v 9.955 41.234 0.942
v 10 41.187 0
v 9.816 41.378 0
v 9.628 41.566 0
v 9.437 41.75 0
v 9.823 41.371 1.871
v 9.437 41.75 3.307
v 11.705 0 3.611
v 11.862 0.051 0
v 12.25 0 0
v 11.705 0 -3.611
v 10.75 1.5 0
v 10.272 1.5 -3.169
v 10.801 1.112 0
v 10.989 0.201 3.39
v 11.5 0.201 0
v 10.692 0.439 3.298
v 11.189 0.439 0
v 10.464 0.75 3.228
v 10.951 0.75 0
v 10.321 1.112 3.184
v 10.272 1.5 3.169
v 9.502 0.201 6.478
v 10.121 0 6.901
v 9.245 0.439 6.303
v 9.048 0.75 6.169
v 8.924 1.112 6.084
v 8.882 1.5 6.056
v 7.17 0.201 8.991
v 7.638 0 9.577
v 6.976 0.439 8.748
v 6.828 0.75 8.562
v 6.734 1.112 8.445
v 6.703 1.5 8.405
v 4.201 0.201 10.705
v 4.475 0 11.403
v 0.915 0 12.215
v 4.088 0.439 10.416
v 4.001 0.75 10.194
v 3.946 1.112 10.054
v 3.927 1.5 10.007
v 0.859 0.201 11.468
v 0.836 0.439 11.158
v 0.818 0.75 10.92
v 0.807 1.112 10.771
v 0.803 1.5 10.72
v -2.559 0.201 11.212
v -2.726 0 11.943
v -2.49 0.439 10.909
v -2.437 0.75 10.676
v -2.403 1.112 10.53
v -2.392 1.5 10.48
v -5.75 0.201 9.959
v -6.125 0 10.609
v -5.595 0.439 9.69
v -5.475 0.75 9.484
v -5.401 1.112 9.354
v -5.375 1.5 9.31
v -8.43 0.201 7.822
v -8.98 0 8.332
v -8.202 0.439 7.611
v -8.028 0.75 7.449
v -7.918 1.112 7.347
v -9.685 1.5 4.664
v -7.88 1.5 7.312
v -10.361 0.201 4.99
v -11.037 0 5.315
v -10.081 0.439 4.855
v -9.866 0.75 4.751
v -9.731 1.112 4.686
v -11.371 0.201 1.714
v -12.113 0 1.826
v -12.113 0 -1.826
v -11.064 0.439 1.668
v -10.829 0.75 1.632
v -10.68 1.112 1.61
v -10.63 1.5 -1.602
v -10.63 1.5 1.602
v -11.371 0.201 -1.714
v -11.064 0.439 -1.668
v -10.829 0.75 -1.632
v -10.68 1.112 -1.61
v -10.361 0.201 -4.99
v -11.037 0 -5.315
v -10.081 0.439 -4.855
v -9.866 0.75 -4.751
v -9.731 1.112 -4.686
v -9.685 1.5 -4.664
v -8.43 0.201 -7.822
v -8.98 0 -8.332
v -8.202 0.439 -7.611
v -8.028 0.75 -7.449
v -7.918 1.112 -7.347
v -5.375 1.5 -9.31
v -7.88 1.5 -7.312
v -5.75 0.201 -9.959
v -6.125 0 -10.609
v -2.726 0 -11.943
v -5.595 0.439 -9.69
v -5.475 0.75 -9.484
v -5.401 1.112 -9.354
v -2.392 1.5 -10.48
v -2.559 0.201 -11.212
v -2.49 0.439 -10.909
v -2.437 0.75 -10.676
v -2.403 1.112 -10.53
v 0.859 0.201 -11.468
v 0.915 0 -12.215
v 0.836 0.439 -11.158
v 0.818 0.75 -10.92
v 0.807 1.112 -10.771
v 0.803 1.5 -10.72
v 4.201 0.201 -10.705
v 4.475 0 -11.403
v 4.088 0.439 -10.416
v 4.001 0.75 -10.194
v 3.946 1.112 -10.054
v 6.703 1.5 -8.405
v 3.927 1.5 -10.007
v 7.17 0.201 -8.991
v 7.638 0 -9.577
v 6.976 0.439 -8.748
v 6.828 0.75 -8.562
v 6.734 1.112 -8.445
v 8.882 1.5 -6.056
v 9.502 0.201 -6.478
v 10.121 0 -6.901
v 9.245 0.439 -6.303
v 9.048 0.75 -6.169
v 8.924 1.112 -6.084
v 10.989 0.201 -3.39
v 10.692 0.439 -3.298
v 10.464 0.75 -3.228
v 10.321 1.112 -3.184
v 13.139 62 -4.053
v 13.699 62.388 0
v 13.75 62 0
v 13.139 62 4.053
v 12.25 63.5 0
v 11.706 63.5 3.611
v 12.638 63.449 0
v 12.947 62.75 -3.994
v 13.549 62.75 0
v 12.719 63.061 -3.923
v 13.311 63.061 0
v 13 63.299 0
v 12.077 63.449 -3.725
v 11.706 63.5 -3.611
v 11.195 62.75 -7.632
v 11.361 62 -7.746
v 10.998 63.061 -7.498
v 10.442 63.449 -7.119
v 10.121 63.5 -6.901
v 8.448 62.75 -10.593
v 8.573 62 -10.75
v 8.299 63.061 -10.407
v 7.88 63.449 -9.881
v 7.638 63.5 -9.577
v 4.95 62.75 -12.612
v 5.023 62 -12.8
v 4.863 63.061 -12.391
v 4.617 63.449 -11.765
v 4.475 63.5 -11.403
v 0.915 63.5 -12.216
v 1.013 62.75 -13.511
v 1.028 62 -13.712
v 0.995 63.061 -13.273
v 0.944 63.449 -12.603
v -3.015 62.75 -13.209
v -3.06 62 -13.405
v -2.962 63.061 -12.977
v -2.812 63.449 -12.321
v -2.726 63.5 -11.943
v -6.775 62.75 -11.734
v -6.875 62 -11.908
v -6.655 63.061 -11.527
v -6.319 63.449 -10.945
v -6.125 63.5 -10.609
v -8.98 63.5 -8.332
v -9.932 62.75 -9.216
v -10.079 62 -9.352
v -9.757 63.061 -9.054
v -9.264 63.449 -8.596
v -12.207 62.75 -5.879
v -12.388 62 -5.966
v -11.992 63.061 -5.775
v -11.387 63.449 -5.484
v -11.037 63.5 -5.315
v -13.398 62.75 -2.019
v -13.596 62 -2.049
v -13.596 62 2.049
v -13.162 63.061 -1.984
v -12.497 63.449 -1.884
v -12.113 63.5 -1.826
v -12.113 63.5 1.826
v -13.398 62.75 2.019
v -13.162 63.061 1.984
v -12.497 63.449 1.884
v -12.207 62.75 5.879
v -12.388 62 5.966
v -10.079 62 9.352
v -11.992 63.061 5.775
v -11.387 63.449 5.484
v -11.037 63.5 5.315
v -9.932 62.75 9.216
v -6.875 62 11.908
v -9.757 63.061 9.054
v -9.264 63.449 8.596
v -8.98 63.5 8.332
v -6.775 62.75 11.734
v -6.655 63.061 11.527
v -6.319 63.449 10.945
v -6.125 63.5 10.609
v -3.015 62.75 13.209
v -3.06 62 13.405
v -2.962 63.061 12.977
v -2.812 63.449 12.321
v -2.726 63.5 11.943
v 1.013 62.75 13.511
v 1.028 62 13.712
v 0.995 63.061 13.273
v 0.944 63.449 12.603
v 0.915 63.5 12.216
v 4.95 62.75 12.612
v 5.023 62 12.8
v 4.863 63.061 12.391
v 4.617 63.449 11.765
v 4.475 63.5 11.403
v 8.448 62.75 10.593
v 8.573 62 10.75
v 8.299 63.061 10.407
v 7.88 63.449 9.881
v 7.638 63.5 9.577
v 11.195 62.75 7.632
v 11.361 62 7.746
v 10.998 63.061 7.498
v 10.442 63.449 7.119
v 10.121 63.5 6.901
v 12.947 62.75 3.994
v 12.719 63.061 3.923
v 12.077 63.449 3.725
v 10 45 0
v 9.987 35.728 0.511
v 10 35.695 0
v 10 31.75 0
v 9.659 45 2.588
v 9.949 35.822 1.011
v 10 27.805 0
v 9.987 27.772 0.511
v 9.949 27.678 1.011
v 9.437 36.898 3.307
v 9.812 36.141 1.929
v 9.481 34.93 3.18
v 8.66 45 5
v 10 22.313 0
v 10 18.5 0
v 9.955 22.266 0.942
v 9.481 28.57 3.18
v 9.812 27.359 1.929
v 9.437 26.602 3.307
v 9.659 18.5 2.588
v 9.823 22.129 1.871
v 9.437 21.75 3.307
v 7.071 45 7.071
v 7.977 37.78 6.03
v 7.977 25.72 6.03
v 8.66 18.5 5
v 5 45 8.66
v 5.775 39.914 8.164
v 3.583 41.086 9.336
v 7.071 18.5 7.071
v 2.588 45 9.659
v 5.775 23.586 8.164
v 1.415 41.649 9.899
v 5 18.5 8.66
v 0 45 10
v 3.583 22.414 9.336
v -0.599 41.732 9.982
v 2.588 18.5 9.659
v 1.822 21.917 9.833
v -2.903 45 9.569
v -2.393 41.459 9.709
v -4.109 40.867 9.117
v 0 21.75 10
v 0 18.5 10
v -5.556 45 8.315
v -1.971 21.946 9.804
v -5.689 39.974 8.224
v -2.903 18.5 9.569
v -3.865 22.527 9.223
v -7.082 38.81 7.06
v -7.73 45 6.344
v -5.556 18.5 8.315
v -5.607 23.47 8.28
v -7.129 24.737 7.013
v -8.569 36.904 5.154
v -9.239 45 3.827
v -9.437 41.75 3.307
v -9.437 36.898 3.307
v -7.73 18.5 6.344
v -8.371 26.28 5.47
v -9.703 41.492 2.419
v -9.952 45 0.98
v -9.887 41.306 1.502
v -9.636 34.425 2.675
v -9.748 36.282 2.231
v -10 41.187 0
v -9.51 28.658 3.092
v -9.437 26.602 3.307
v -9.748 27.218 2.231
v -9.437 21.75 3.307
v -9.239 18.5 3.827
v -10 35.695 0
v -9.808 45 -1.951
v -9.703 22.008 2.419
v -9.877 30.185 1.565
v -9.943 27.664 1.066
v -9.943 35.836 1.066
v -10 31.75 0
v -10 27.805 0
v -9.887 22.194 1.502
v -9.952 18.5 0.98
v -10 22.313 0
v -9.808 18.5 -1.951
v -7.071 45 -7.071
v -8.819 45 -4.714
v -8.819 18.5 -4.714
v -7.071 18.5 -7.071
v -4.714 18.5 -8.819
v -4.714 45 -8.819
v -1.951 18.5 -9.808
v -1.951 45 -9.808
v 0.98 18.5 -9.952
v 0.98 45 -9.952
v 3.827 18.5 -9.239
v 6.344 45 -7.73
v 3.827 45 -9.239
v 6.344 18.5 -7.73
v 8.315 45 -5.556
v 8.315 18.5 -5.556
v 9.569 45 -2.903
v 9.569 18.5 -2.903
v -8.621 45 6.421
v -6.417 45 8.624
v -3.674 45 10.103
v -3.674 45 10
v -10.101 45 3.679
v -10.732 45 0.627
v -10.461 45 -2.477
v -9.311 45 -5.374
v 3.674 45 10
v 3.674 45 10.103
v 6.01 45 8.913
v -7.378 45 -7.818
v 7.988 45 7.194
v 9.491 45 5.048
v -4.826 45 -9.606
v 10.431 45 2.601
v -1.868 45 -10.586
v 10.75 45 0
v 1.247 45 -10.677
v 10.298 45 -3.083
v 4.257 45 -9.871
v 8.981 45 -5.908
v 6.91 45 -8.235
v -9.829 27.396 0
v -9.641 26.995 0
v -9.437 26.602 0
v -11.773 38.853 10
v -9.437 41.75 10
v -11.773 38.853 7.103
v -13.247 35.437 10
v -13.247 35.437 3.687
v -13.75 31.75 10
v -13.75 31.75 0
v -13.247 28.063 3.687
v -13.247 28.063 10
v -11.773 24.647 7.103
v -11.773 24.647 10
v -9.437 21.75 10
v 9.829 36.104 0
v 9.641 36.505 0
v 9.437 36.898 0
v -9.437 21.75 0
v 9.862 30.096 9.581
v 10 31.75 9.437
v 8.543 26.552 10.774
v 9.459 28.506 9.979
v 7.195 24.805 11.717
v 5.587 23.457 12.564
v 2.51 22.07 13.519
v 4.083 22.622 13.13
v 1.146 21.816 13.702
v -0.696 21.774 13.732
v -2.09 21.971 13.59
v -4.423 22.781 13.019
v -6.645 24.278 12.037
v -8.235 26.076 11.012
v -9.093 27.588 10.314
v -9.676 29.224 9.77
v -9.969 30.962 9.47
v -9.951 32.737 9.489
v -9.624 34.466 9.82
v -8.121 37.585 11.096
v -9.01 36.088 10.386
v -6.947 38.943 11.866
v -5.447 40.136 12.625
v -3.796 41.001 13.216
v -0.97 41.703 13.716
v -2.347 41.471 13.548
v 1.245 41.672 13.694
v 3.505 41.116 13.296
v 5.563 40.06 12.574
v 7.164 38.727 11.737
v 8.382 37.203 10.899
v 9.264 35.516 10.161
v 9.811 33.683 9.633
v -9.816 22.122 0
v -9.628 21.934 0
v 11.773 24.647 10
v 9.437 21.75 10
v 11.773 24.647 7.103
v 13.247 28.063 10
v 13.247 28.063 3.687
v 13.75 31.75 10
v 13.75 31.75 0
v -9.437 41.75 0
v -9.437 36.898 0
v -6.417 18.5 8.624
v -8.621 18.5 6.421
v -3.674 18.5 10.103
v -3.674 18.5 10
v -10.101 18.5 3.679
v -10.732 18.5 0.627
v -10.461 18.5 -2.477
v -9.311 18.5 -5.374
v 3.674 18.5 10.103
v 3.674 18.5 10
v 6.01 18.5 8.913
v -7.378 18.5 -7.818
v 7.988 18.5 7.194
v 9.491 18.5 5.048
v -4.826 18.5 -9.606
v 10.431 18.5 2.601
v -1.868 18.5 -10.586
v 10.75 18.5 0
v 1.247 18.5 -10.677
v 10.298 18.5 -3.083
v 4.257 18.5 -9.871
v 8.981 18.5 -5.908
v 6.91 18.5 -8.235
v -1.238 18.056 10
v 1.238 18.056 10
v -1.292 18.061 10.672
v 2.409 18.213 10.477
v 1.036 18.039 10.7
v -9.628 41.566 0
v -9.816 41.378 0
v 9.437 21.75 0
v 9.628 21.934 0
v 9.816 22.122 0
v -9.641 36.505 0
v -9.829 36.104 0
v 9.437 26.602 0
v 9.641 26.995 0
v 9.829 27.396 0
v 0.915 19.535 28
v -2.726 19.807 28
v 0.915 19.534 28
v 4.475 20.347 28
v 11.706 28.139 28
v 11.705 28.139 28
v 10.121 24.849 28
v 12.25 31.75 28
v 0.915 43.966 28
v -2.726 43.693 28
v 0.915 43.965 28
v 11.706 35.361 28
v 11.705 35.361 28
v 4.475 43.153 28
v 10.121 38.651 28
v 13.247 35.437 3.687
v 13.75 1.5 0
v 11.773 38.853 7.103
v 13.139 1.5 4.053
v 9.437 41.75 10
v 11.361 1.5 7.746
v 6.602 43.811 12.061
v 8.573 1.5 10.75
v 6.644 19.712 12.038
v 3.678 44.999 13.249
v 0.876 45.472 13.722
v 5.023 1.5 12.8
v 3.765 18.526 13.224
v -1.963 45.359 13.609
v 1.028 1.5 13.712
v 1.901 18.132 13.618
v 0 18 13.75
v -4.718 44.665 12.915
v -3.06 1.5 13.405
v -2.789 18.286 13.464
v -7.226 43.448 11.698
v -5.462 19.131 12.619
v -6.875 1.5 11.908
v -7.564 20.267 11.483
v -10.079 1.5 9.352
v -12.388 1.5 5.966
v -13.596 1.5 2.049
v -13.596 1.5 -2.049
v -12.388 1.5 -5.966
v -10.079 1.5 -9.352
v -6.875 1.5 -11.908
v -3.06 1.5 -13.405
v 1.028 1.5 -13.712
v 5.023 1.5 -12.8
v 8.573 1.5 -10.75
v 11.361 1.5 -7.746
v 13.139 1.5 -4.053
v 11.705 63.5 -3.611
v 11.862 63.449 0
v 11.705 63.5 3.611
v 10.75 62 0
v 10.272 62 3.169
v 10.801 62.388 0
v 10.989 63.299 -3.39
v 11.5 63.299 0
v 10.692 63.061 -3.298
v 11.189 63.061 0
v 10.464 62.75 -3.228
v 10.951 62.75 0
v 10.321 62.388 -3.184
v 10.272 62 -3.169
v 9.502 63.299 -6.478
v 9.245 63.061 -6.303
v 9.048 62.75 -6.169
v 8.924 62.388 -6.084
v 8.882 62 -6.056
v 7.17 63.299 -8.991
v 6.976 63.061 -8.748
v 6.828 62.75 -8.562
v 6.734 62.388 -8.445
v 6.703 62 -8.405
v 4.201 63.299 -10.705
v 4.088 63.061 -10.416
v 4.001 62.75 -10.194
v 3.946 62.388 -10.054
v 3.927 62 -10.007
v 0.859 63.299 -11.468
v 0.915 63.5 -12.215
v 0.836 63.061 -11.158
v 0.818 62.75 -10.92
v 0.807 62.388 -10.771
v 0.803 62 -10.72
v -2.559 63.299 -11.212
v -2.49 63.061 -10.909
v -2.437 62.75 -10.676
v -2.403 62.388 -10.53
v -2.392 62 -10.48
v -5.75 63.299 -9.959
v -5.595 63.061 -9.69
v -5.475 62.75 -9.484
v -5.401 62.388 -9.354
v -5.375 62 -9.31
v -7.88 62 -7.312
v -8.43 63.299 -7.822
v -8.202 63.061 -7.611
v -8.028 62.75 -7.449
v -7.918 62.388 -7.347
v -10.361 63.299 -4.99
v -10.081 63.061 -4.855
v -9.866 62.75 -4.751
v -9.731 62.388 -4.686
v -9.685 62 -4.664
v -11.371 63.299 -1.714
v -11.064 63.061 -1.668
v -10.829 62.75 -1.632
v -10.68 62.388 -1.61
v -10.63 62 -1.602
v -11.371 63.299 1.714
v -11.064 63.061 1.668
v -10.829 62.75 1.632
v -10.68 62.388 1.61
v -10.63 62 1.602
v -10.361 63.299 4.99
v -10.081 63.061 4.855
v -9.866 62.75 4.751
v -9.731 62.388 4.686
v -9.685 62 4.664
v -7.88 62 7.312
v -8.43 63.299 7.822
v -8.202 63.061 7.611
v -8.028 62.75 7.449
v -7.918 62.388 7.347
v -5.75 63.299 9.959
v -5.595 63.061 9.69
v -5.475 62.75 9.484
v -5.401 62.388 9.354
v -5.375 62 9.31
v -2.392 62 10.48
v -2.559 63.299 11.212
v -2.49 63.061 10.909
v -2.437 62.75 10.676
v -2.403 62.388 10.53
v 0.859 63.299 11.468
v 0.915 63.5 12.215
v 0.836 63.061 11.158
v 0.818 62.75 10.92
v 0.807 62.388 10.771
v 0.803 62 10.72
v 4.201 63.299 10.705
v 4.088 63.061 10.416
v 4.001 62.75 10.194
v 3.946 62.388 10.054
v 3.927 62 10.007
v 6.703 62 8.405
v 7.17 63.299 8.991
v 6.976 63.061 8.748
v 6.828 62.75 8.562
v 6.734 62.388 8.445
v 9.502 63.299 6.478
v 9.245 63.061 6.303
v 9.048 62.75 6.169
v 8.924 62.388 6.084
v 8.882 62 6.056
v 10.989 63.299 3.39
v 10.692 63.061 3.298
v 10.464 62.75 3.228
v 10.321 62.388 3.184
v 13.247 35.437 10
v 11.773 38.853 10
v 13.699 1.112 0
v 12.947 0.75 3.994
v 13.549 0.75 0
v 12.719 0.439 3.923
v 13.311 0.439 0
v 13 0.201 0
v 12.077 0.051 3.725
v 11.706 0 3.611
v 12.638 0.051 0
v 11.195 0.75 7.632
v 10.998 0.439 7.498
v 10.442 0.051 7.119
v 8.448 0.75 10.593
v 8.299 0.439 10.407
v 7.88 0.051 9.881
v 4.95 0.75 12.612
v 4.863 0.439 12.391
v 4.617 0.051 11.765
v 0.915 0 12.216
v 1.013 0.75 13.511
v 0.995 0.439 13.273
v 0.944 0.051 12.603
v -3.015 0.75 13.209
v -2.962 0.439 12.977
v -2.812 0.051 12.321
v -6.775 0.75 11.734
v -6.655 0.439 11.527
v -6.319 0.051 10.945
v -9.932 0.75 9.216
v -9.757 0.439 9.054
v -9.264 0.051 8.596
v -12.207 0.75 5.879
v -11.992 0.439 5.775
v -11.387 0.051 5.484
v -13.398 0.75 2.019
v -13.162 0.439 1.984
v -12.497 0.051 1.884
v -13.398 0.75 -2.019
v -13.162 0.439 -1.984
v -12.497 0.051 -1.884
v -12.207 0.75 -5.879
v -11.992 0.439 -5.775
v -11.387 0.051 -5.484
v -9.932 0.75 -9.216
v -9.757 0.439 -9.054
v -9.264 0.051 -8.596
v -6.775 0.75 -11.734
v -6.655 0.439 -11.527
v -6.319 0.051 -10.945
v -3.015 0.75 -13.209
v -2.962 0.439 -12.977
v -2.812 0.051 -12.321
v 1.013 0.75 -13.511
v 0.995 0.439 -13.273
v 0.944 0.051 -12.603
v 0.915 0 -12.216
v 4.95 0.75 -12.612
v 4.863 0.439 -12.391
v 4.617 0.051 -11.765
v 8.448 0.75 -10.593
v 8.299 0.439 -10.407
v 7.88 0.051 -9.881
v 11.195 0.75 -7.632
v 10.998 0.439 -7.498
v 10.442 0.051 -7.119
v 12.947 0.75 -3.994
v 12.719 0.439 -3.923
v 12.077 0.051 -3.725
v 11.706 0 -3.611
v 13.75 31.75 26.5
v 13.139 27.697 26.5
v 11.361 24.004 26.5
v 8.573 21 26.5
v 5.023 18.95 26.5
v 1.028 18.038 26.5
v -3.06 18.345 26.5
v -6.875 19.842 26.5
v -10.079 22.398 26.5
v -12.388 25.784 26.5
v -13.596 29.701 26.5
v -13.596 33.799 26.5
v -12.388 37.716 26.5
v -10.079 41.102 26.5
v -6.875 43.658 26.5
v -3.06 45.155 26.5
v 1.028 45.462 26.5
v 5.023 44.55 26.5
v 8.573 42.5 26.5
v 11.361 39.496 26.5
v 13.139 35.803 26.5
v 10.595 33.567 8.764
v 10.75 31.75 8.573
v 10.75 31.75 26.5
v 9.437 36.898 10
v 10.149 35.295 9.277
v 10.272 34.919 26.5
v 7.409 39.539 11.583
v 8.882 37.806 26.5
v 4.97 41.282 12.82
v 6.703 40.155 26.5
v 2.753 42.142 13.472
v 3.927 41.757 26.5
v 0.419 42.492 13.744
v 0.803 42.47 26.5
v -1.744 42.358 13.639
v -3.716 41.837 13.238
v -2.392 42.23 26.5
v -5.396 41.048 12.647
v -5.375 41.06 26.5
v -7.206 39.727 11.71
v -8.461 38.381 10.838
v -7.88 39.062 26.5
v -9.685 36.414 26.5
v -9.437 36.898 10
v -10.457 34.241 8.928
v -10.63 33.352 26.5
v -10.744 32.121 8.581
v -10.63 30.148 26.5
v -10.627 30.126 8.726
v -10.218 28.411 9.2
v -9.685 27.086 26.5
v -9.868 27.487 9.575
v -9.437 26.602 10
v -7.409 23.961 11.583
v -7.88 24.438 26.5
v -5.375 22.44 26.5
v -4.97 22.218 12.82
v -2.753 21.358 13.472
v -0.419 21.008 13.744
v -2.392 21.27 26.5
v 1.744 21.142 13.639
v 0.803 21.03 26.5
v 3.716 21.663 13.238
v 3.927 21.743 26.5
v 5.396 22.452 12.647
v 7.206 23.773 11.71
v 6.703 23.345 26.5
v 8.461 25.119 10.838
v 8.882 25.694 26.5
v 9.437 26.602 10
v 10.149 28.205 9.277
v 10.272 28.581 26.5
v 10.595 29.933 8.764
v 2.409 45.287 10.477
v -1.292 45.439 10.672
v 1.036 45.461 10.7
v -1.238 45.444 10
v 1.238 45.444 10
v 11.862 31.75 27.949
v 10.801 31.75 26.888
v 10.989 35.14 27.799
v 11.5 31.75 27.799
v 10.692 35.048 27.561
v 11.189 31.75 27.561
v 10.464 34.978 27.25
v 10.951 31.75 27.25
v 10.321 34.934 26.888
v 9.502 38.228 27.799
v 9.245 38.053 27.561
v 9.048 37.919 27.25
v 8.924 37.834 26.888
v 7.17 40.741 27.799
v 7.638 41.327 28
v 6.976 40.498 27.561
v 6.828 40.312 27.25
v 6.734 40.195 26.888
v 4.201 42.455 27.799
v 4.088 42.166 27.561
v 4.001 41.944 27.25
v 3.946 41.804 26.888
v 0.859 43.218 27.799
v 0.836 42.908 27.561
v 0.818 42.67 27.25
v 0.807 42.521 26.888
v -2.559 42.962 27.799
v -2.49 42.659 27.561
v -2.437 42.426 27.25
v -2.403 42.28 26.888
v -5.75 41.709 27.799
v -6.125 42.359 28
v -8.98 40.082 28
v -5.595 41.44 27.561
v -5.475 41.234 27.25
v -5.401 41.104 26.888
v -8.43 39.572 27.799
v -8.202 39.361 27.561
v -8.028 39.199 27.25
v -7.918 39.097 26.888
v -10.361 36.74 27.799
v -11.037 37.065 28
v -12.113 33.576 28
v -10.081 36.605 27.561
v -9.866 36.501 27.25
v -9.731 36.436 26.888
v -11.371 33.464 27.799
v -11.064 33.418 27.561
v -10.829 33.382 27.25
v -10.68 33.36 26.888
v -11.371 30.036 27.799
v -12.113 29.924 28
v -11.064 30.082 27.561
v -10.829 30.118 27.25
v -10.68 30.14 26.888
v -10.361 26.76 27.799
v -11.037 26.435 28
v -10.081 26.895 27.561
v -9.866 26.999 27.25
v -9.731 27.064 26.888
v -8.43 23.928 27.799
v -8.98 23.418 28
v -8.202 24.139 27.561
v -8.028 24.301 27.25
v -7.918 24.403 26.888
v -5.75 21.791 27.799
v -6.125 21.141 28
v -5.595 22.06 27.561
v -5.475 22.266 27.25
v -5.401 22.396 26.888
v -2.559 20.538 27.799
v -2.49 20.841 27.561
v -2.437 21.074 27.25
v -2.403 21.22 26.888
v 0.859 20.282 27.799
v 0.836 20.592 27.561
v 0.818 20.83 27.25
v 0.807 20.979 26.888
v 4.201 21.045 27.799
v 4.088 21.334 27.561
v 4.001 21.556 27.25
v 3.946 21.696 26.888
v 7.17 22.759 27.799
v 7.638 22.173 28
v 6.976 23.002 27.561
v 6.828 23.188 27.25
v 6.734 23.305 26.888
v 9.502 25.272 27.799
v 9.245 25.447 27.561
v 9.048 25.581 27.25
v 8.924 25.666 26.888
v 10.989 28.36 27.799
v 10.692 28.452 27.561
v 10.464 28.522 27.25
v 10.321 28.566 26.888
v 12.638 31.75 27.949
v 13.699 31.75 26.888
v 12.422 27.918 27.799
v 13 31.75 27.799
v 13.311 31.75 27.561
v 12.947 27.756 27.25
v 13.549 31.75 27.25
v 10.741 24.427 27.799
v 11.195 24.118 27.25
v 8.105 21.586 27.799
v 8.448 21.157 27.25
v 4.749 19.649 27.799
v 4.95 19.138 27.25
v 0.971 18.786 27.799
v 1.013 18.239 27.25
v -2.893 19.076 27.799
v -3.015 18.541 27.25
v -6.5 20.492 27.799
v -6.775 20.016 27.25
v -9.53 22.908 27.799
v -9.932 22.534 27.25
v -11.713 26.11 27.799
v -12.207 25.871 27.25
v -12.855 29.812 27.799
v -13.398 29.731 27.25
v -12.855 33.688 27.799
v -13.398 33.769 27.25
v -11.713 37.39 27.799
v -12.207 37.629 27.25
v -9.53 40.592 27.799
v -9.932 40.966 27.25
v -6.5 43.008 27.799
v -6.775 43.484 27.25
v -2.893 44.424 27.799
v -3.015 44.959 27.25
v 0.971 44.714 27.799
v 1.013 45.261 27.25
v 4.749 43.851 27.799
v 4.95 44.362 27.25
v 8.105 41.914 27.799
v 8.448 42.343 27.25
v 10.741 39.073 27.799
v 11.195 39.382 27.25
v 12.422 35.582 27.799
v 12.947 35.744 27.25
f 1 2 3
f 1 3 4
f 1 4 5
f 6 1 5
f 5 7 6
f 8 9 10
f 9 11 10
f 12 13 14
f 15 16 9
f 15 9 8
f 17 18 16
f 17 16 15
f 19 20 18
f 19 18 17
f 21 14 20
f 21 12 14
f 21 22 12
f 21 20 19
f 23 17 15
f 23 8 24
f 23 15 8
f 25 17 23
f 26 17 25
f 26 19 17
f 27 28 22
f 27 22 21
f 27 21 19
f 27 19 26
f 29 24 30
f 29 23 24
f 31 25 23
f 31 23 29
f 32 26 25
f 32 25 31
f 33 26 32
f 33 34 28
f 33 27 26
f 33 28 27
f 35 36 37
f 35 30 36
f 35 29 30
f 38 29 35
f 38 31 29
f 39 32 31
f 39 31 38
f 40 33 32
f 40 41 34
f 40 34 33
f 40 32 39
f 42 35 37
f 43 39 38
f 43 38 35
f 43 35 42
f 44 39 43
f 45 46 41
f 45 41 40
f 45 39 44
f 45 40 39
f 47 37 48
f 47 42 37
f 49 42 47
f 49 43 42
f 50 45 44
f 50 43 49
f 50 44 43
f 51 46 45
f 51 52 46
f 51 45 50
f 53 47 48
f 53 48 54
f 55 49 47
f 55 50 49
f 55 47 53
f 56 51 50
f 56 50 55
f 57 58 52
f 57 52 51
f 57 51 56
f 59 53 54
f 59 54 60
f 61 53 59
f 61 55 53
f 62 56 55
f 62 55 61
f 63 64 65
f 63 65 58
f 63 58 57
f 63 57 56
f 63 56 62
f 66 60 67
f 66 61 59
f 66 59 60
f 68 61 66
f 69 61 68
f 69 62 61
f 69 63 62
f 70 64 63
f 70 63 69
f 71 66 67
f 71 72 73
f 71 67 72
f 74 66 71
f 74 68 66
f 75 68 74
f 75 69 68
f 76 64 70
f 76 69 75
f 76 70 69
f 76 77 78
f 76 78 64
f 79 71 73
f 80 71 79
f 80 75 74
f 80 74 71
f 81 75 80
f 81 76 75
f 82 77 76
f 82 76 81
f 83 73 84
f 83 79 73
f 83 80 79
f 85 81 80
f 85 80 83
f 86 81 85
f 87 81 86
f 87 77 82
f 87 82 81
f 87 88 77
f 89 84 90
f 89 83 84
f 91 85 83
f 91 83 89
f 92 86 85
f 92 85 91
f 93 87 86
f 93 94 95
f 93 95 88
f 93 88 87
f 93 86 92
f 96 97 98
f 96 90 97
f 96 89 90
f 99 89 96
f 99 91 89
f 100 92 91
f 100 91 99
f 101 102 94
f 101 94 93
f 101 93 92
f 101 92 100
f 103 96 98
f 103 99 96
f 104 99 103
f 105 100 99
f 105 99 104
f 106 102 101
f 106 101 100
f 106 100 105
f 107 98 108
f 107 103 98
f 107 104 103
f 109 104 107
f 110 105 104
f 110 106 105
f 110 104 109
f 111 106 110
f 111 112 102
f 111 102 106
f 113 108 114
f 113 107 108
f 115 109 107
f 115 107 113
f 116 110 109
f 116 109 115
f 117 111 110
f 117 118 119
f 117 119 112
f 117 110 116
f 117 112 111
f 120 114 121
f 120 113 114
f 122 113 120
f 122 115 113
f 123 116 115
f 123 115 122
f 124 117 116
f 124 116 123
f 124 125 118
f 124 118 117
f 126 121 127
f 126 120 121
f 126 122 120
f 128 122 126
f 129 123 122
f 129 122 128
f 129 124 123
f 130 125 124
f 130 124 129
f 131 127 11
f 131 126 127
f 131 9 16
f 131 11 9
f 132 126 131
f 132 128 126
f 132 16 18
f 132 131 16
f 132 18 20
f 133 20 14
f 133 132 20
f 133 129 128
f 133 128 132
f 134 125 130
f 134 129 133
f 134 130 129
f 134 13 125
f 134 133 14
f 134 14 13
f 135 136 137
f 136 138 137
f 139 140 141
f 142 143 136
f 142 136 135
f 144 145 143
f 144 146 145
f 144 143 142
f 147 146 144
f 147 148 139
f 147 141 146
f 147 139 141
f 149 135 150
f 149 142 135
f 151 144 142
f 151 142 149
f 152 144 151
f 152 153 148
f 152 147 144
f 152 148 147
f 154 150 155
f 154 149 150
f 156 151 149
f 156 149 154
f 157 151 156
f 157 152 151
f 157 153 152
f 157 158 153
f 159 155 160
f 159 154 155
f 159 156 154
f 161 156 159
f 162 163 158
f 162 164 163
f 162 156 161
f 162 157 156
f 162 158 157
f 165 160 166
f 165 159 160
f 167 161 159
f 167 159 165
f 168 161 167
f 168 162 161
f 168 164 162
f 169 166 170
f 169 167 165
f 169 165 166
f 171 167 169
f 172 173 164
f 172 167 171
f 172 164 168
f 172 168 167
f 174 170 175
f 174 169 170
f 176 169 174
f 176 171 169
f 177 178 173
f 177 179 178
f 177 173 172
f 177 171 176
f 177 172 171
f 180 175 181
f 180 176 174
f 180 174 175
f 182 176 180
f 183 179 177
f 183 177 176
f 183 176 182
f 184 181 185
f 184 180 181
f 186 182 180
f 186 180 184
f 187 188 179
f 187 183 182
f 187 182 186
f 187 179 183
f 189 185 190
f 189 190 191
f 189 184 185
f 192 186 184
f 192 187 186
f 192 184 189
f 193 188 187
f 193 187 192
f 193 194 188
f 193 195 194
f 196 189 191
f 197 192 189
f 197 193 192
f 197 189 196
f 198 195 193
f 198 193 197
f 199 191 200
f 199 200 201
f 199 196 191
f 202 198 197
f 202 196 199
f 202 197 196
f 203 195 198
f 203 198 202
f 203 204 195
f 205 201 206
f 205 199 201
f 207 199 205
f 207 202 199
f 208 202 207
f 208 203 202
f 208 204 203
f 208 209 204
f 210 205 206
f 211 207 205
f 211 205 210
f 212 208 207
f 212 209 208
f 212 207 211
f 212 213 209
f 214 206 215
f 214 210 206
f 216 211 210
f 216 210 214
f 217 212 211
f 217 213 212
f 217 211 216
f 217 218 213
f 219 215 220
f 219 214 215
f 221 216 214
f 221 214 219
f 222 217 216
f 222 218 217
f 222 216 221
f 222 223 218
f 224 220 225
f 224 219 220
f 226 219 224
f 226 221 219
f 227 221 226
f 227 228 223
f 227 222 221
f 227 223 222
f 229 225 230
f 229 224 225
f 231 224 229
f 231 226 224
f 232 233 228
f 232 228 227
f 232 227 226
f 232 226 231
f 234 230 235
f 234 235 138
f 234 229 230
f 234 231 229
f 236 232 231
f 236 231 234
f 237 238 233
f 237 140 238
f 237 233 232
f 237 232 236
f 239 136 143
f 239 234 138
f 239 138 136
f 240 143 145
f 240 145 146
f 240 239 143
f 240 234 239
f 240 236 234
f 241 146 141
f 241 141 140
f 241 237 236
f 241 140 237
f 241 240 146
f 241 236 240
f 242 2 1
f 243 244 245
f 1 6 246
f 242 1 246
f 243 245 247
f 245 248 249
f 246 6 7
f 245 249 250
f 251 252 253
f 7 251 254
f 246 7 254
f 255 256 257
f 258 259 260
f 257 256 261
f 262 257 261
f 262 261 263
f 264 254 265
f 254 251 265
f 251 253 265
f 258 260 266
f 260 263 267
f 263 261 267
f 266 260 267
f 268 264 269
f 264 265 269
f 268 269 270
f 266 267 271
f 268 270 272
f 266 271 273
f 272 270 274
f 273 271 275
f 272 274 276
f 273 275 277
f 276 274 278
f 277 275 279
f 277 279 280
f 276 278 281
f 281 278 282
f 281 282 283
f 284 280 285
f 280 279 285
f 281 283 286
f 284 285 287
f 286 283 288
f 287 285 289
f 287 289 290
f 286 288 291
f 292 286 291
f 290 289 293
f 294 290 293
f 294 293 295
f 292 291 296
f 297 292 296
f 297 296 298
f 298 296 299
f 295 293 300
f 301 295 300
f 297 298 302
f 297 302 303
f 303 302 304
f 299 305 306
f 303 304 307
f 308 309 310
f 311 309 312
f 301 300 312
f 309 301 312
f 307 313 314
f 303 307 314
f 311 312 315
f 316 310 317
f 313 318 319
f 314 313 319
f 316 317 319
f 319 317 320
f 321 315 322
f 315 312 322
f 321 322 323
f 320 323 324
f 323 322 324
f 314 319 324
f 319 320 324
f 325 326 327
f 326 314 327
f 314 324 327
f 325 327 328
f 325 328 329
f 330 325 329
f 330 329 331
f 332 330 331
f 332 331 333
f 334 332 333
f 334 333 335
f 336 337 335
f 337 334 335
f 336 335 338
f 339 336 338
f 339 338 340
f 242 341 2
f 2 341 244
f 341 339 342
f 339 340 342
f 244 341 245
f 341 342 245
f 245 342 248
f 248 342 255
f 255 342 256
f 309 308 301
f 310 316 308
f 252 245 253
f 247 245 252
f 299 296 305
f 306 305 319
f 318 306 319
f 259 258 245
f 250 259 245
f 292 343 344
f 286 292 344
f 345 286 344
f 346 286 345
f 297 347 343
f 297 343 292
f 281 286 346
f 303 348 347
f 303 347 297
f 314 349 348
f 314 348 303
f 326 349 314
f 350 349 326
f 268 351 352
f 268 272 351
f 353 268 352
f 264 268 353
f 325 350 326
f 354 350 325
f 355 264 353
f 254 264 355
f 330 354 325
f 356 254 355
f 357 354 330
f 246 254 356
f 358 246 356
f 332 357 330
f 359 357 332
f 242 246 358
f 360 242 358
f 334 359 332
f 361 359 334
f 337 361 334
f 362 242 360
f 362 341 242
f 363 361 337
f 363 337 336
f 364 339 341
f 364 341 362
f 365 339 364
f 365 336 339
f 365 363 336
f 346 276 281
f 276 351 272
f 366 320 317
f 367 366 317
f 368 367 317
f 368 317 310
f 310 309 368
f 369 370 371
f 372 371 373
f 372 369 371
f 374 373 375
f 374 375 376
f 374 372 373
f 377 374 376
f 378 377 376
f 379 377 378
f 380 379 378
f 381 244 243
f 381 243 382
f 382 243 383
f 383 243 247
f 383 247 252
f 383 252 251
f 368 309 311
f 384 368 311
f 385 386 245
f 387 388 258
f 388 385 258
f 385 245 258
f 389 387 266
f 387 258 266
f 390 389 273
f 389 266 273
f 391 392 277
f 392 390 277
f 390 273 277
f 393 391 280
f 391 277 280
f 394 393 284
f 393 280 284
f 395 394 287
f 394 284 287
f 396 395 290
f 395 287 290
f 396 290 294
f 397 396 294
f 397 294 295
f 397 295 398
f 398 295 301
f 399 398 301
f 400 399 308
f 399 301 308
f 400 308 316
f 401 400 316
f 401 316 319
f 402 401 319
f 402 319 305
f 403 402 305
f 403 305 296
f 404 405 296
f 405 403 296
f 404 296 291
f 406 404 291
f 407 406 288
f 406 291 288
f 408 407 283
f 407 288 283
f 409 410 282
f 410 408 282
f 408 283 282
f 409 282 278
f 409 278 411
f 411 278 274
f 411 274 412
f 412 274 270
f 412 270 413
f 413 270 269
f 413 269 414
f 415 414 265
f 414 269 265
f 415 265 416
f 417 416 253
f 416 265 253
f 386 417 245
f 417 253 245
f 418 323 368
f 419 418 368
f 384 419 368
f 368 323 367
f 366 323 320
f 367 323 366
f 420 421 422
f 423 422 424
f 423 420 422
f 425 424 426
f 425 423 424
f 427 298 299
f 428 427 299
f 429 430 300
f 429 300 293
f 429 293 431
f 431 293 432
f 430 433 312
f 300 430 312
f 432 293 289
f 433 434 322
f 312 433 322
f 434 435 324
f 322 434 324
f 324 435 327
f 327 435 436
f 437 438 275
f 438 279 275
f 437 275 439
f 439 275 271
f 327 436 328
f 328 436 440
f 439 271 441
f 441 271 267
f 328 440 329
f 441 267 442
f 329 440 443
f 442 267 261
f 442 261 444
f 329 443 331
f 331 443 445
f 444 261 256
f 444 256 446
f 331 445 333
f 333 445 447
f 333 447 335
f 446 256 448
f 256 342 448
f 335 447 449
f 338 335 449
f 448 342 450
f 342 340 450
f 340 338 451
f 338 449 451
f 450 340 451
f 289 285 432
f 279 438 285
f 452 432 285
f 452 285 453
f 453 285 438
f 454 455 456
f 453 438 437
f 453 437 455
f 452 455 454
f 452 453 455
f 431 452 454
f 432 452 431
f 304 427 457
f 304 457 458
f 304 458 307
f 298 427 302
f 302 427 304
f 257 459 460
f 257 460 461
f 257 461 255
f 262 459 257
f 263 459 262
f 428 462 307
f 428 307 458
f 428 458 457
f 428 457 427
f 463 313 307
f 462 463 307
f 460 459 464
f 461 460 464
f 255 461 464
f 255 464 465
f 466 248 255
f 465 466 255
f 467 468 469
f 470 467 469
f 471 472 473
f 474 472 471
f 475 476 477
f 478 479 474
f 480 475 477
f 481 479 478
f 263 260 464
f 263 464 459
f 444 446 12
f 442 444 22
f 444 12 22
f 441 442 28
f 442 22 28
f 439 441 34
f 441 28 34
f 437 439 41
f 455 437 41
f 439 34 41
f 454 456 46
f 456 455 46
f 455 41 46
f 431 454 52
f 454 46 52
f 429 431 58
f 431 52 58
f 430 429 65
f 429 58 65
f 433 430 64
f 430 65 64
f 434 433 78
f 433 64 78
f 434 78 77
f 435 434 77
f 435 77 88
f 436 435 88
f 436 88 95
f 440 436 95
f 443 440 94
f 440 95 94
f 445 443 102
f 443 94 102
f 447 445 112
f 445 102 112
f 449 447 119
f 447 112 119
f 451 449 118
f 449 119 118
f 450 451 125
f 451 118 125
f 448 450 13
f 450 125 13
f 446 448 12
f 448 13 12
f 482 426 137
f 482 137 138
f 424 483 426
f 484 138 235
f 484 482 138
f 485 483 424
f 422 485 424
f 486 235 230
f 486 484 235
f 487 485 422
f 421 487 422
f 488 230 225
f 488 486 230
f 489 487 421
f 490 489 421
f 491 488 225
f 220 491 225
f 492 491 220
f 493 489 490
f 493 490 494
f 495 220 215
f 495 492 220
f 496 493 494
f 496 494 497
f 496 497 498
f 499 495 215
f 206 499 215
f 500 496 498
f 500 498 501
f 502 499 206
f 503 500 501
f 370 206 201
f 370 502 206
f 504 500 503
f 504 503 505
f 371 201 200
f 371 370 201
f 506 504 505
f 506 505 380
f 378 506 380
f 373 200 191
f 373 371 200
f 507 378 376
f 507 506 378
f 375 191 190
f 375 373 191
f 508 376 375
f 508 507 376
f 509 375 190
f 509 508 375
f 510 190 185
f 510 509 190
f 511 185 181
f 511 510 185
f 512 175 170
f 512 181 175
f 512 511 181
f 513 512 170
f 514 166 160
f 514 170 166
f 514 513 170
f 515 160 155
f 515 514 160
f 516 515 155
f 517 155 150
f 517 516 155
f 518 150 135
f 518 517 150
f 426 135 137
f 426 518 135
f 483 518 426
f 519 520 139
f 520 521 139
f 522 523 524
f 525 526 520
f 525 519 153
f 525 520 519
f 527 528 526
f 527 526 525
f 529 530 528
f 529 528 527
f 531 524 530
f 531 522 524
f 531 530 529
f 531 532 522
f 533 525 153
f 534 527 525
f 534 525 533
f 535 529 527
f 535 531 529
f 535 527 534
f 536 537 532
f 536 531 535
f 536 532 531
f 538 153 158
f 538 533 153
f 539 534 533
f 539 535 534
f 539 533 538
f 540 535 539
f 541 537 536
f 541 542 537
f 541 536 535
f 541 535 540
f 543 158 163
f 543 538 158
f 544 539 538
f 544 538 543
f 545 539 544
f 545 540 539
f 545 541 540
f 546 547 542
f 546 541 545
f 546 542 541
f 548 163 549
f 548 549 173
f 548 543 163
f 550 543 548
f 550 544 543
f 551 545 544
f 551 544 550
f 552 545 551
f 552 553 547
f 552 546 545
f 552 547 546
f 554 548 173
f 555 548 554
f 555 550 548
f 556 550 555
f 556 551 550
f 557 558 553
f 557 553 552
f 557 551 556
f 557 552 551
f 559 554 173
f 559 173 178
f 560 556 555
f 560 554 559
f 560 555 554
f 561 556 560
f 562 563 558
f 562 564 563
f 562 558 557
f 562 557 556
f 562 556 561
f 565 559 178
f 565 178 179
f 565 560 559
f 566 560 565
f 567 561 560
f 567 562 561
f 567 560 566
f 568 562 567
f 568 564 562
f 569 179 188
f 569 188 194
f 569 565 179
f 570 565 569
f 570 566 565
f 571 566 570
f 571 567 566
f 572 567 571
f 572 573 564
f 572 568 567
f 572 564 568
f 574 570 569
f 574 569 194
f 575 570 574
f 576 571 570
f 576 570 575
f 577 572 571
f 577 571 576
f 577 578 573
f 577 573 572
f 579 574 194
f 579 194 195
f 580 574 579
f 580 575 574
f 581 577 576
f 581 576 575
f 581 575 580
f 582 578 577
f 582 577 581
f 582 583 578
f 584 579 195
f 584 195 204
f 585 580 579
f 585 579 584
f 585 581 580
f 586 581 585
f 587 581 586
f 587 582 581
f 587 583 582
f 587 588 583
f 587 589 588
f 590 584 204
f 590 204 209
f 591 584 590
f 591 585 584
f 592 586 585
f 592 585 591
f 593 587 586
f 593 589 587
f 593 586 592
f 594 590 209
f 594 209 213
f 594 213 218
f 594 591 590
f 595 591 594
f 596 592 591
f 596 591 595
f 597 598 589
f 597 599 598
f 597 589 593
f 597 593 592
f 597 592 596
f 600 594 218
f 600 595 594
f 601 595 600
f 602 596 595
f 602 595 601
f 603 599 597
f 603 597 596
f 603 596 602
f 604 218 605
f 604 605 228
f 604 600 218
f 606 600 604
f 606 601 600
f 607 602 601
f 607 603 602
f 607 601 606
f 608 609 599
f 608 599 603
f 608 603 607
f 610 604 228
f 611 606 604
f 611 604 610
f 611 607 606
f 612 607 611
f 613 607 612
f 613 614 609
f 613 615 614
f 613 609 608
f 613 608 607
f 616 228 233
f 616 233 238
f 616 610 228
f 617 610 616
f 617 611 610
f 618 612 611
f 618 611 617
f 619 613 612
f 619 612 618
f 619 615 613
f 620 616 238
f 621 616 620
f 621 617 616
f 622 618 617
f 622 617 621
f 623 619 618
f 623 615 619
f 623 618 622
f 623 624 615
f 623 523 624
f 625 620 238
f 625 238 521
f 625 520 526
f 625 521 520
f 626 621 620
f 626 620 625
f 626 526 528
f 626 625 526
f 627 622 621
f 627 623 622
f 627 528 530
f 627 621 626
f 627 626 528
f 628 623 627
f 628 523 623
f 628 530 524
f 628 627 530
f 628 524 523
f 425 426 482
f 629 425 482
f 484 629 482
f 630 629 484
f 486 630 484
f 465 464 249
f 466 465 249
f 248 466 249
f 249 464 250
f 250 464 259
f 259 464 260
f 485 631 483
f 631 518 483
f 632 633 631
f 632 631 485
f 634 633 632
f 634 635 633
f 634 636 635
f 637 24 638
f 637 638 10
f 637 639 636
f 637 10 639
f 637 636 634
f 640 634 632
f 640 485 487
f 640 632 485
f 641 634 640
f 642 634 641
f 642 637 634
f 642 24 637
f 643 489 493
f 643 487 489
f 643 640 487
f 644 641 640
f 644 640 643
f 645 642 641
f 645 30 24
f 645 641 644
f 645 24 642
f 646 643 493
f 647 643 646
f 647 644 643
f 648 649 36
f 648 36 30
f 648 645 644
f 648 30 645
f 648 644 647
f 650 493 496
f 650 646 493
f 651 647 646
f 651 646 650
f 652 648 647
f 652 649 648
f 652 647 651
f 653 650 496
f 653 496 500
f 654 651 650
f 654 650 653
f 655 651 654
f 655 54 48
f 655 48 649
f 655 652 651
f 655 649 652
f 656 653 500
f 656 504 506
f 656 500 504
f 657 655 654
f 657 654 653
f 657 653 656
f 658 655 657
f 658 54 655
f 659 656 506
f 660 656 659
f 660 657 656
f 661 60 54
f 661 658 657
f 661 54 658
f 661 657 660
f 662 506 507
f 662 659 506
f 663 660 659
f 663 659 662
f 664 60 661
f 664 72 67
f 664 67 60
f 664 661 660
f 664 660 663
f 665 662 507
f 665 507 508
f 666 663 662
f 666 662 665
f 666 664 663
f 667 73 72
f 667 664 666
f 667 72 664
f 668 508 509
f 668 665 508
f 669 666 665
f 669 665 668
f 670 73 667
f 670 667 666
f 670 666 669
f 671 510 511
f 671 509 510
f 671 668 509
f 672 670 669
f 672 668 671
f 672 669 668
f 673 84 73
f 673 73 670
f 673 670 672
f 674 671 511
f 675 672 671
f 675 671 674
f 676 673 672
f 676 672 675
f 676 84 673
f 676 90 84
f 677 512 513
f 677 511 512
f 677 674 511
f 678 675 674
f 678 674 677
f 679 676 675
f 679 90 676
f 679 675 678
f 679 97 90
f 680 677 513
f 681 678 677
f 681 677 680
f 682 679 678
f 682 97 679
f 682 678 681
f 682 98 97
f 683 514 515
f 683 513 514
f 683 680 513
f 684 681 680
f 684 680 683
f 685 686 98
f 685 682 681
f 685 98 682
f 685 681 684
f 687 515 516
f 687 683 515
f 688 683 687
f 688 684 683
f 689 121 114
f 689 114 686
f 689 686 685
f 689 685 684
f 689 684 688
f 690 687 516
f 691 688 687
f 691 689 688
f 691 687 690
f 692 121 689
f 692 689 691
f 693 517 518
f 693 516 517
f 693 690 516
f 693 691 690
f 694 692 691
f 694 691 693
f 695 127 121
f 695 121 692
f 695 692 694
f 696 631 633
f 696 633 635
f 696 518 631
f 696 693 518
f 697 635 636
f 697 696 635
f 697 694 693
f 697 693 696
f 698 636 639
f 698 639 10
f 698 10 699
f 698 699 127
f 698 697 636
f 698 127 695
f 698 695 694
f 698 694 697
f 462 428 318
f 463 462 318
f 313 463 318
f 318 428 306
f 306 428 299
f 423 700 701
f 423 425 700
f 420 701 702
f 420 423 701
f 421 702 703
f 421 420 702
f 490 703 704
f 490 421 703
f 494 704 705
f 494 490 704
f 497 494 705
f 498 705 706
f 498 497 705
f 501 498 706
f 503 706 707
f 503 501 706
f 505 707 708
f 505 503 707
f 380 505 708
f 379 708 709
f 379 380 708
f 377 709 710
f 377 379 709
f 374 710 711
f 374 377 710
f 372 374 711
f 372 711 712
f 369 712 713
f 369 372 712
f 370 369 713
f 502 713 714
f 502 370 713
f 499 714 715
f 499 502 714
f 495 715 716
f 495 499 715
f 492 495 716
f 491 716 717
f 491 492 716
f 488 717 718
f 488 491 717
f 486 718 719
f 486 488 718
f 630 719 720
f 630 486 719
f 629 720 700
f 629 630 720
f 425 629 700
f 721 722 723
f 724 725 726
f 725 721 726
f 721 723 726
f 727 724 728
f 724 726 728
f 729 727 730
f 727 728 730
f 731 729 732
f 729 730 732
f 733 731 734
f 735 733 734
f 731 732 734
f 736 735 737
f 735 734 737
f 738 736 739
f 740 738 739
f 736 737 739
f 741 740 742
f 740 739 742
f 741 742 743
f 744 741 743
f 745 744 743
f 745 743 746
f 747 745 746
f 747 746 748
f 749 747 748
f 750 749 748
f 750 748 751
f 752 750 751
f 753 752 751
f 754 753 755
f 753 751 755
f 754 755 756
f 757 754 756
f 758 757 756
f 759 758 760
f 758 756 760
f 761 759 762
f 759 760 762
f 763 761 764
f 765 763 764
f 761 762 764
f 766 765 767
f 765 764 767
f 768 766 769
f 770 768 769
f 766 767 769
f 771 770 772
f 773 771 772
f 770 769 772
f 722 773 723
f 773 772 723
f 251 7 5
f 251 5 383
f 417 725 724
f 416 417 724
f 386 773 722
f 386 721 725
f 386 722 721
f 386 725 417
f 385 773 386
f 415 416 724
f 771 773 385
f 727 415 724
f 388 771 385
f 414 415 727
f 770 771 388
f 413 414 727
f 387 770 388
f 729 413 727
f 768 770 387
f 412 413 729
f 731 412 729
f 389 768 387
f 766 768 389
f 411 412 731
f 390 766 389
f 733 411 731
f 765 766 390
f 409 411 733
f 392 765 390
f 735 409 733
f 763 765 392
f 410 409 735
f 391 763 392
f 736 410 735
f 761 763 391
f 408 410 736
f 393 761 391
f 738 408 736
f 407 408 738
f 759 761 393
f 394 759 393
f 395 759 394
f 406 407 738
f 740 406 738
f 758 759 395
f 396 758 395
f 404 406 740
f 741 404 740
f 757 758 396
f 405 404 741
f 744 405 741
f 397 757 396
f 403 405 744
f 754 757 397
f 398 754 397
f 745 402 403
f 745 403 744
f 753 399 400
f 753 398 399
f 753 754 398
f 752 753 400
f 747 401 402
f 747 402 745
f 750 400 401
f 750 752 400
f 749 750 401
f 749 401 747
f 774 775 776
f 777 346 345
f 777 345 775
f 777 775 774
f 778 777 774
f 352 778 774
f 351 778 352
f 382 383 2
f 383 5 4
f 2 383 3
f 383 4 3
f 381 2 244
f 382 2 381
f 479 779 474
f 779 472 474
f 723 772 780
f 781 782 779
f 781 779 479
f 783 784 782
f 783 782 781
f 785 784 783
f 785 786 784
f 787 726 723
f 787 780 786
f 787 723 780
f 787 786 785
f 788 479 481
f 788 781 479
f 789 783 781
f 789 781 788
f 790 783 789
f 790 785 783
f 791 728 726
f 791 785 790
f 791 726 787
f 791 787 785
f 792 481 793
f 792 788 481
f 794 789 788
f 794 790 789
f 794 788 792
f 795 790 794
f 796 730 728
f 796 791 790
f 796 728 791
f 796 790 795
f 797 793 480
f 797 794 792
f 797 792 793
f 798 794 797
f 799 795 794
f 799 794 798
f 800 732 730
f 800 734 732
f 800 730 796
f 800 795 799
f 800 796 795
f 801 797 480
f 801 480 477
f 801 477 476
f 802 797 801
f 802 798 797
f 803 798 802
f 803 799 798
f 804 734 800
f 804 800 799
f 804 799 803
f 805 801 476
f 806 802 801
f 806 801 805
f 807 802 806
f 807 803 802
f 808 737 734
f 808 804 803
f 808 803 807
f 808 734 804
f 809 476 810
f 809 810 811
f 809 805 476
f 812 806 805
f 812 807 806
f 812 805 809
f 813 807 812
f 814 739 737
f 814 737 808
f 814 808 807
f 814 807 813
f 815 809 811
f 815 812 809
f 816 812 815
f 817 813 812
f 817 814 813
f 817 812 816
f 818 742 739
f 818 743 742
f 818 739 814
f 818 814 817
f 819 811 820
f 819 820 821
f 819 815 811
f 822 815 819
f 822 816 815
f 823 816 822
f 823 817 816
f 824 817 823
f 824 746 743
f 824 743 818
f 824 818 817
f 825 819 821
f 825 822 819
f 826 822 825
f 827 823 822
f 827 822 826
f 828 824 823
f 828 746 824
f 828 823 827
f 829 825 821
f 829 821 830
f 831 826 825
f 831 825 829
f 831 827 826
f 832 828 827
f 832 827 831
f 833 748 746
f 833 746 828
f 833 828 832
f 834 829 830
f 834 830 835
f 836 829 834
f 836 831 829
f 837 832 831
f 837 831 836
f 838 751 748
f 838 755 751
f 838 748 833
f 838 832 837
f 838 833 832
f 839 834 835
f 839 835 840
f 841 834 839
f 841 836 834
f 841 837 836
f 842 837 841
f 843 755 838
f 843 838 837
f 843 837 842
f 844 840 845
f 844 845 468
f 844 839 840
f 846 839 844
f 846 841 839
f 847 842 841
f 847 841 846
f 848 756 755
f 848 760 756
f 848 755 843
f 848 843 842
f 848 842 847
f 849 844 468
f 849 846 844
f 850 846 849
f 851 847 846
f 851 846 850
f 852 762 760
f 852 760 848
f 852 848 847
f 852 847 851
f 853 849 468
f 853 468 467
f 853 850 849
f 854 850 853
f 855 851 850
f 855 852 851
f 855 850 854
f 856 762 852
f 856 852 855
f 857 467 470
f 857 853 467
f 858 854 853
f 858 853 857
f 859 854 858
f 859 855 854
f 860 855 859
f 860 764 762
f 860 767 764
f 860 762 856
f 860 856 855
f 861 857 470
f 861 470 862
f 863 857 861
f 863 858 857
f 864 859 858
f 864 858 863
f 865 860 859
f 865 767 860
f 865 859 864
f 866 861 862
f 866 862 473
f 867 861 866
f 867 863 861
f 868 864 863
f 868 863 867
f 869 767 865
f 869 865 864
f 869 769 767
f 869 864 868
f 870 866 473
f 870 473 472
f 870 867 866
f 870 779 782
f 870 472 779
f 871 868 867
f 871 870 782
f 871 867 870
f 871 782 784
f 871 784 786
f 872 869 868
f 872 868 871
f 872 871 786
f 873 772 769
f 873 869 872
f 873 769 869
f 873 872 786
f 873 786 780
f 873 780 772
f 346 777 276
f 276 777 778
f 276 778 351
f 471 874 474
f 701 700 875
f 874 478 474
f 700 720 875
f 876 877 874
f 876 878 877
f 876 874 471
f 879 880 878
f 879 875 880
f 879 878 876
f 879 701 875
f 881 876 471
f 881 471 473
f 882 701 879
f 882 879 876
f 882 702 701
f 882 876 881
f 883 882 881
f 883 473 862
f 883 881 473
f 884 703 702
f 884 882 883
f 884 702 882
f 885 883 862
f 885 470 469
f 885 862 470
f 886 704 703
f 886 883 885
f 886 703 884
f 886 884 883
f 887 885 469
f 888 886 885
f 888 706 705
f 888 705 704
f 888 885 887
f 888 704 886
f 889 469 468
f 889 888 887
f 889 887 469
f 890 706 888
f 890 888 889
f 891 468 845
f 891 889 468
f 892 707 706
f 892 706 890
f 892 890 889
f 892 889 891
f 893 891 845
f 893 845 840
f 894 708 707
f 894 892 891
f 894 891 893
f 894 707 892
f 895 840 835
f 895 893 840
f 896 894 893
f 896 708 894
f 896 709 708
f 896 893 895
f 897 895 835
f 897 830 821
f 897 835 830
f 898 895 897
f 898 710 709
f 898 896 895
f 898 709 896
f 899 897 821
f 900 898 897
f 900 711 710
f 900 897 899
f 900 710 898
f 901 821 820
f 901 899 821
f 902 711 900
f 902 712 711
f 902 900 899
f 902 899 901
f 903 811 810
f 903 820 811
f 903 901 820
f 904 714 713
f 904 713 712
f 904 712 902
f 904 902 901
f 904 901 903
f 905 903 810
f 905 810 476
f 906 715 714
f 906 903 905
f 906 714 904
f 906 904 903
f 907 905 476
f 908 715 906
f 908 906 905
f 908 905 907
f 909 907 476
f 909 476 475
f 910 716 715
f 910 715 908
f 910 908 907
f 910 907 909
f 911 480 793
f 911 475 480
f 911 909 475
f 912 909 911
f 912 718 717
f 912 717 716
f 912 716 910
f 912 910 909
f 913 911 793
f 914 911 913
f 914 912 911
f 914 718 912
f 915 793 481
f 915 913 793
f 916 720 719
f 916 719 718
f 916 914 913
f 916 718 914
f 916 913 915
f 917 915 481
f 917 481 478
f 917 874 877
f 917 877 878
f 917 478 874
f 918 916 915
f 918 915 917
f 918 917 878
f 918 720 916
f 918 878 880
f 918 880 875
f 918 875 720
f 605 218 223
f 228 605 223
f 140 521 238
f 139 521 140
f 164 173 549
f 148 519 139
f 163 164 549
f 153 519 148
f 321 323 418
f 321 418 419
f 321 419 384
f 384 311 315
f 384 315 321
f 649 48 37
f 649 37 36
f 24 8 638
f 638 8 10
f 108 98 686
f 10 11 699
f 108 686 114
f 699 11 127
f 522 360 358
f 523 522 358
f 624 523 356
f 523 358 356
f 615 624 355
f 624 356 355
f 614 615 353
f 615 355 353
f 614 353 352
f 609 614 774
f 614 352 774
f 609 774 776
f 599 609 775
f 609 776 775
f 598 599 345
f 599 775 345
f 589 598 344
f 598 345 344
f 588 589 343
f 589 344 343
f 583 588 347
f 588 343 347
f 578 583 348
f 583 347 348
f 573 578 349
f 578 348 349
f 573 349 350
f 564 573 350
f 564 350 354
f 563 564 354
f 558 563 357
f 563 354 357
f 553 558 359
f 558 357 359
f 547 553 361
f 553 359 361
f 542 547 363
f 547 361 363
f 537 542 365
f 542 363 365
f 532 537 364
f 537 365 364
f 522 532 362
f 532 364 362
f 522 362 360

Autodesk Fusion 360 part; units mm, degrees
sketch "Sketch1" plane through (0, 0, 0) normal (0, 1, 0) x (1, 0, 0)
  circle A0 centre (0, 0) radius 10.75
  circle A1 centre (0, 0) radius 13.75
  dimension "d1" = 21.5
  dimension "d2" = 27.5
extrude "Extrude1" add sketch "Sketch1" along normal blind 63.5
ref_plane "WorkPlane1" through (0, 18.5, 0) normal (0, 1, 0) x (0, 0, 1)
sketch "Sketch2" plane through (0, 18.5, 0) normal (0, 1, 0) x (1, 0, 0)
  circle A0 centre (0, 0) radius 10
  circle A1 centre (0, 0) radius 10.75
  dimension "d6" = 20
  dimension "d7" = 21.5
extrude "Extrude2" add sketch "Sketch2" along normal blind 26.5
fillet "Fillet1" radius 1.5 1 edges at (-12.8195, 63.5, 4.9722)
fillet "Fillet2" radius 1.5 1 edges at (-10.0225, 63.5, -3.8874)
fillet "Fillet3" radius 1.5 1 edges at (-12.8195, 0, 4.9722)
fillet "Fillet4" radius 1.5 1 edges at (-10.0225, 0, -3.8874)
ref_plane "WorkPlane2" through (0, 0, 10) normal (0, 0, 1) x (1, 0, 0)
sketch "Sketch3" plane through (0, 0, 10) normal (0, 0, 1) x (1, 0, 0)
  line L0 (0, 0) -> (0, 31.75) construction
  circle A0 centre (0, 31.75) radius 10.75
  circle A1 centre (0, 31.75) radius 13.75
  dimension "d19" = 31.75
  dimension "d20" = 21.5
  dimension "d21" = 27.5
extrude "Extrude3" add sketch "Sketch3" along normal blind 18
extrude "Extrude4" add 1 faces at (11.2787, 25.8512, 10) along direction (0, 0, -1) blind 10
extrude "Extrude5" add 1 faces at (-11.4002, 37.3943, 10) along direction (0, 0, -1) blind 10
sketch "Sketch4" plane through (0, 0, 0) normal (0, 0, 1) x (1, 0, 0)
  line L0 (0, 0) -> (0, 31.75) construction
  circle A0 centre (0, 31.75) radius 10
  dimension "d28" = 31.75
  dimension "d29" = 20
extrude "Extrude6" cut sketch "Sketch4" along normal blind 37
fillet "Fillet5" radius 1.5 1 edges at (-12.8195, 26.7778, 28)
fillet "Fillet6" radius 1.5 1 edges at (-10.0225, 35.6374, 28)
